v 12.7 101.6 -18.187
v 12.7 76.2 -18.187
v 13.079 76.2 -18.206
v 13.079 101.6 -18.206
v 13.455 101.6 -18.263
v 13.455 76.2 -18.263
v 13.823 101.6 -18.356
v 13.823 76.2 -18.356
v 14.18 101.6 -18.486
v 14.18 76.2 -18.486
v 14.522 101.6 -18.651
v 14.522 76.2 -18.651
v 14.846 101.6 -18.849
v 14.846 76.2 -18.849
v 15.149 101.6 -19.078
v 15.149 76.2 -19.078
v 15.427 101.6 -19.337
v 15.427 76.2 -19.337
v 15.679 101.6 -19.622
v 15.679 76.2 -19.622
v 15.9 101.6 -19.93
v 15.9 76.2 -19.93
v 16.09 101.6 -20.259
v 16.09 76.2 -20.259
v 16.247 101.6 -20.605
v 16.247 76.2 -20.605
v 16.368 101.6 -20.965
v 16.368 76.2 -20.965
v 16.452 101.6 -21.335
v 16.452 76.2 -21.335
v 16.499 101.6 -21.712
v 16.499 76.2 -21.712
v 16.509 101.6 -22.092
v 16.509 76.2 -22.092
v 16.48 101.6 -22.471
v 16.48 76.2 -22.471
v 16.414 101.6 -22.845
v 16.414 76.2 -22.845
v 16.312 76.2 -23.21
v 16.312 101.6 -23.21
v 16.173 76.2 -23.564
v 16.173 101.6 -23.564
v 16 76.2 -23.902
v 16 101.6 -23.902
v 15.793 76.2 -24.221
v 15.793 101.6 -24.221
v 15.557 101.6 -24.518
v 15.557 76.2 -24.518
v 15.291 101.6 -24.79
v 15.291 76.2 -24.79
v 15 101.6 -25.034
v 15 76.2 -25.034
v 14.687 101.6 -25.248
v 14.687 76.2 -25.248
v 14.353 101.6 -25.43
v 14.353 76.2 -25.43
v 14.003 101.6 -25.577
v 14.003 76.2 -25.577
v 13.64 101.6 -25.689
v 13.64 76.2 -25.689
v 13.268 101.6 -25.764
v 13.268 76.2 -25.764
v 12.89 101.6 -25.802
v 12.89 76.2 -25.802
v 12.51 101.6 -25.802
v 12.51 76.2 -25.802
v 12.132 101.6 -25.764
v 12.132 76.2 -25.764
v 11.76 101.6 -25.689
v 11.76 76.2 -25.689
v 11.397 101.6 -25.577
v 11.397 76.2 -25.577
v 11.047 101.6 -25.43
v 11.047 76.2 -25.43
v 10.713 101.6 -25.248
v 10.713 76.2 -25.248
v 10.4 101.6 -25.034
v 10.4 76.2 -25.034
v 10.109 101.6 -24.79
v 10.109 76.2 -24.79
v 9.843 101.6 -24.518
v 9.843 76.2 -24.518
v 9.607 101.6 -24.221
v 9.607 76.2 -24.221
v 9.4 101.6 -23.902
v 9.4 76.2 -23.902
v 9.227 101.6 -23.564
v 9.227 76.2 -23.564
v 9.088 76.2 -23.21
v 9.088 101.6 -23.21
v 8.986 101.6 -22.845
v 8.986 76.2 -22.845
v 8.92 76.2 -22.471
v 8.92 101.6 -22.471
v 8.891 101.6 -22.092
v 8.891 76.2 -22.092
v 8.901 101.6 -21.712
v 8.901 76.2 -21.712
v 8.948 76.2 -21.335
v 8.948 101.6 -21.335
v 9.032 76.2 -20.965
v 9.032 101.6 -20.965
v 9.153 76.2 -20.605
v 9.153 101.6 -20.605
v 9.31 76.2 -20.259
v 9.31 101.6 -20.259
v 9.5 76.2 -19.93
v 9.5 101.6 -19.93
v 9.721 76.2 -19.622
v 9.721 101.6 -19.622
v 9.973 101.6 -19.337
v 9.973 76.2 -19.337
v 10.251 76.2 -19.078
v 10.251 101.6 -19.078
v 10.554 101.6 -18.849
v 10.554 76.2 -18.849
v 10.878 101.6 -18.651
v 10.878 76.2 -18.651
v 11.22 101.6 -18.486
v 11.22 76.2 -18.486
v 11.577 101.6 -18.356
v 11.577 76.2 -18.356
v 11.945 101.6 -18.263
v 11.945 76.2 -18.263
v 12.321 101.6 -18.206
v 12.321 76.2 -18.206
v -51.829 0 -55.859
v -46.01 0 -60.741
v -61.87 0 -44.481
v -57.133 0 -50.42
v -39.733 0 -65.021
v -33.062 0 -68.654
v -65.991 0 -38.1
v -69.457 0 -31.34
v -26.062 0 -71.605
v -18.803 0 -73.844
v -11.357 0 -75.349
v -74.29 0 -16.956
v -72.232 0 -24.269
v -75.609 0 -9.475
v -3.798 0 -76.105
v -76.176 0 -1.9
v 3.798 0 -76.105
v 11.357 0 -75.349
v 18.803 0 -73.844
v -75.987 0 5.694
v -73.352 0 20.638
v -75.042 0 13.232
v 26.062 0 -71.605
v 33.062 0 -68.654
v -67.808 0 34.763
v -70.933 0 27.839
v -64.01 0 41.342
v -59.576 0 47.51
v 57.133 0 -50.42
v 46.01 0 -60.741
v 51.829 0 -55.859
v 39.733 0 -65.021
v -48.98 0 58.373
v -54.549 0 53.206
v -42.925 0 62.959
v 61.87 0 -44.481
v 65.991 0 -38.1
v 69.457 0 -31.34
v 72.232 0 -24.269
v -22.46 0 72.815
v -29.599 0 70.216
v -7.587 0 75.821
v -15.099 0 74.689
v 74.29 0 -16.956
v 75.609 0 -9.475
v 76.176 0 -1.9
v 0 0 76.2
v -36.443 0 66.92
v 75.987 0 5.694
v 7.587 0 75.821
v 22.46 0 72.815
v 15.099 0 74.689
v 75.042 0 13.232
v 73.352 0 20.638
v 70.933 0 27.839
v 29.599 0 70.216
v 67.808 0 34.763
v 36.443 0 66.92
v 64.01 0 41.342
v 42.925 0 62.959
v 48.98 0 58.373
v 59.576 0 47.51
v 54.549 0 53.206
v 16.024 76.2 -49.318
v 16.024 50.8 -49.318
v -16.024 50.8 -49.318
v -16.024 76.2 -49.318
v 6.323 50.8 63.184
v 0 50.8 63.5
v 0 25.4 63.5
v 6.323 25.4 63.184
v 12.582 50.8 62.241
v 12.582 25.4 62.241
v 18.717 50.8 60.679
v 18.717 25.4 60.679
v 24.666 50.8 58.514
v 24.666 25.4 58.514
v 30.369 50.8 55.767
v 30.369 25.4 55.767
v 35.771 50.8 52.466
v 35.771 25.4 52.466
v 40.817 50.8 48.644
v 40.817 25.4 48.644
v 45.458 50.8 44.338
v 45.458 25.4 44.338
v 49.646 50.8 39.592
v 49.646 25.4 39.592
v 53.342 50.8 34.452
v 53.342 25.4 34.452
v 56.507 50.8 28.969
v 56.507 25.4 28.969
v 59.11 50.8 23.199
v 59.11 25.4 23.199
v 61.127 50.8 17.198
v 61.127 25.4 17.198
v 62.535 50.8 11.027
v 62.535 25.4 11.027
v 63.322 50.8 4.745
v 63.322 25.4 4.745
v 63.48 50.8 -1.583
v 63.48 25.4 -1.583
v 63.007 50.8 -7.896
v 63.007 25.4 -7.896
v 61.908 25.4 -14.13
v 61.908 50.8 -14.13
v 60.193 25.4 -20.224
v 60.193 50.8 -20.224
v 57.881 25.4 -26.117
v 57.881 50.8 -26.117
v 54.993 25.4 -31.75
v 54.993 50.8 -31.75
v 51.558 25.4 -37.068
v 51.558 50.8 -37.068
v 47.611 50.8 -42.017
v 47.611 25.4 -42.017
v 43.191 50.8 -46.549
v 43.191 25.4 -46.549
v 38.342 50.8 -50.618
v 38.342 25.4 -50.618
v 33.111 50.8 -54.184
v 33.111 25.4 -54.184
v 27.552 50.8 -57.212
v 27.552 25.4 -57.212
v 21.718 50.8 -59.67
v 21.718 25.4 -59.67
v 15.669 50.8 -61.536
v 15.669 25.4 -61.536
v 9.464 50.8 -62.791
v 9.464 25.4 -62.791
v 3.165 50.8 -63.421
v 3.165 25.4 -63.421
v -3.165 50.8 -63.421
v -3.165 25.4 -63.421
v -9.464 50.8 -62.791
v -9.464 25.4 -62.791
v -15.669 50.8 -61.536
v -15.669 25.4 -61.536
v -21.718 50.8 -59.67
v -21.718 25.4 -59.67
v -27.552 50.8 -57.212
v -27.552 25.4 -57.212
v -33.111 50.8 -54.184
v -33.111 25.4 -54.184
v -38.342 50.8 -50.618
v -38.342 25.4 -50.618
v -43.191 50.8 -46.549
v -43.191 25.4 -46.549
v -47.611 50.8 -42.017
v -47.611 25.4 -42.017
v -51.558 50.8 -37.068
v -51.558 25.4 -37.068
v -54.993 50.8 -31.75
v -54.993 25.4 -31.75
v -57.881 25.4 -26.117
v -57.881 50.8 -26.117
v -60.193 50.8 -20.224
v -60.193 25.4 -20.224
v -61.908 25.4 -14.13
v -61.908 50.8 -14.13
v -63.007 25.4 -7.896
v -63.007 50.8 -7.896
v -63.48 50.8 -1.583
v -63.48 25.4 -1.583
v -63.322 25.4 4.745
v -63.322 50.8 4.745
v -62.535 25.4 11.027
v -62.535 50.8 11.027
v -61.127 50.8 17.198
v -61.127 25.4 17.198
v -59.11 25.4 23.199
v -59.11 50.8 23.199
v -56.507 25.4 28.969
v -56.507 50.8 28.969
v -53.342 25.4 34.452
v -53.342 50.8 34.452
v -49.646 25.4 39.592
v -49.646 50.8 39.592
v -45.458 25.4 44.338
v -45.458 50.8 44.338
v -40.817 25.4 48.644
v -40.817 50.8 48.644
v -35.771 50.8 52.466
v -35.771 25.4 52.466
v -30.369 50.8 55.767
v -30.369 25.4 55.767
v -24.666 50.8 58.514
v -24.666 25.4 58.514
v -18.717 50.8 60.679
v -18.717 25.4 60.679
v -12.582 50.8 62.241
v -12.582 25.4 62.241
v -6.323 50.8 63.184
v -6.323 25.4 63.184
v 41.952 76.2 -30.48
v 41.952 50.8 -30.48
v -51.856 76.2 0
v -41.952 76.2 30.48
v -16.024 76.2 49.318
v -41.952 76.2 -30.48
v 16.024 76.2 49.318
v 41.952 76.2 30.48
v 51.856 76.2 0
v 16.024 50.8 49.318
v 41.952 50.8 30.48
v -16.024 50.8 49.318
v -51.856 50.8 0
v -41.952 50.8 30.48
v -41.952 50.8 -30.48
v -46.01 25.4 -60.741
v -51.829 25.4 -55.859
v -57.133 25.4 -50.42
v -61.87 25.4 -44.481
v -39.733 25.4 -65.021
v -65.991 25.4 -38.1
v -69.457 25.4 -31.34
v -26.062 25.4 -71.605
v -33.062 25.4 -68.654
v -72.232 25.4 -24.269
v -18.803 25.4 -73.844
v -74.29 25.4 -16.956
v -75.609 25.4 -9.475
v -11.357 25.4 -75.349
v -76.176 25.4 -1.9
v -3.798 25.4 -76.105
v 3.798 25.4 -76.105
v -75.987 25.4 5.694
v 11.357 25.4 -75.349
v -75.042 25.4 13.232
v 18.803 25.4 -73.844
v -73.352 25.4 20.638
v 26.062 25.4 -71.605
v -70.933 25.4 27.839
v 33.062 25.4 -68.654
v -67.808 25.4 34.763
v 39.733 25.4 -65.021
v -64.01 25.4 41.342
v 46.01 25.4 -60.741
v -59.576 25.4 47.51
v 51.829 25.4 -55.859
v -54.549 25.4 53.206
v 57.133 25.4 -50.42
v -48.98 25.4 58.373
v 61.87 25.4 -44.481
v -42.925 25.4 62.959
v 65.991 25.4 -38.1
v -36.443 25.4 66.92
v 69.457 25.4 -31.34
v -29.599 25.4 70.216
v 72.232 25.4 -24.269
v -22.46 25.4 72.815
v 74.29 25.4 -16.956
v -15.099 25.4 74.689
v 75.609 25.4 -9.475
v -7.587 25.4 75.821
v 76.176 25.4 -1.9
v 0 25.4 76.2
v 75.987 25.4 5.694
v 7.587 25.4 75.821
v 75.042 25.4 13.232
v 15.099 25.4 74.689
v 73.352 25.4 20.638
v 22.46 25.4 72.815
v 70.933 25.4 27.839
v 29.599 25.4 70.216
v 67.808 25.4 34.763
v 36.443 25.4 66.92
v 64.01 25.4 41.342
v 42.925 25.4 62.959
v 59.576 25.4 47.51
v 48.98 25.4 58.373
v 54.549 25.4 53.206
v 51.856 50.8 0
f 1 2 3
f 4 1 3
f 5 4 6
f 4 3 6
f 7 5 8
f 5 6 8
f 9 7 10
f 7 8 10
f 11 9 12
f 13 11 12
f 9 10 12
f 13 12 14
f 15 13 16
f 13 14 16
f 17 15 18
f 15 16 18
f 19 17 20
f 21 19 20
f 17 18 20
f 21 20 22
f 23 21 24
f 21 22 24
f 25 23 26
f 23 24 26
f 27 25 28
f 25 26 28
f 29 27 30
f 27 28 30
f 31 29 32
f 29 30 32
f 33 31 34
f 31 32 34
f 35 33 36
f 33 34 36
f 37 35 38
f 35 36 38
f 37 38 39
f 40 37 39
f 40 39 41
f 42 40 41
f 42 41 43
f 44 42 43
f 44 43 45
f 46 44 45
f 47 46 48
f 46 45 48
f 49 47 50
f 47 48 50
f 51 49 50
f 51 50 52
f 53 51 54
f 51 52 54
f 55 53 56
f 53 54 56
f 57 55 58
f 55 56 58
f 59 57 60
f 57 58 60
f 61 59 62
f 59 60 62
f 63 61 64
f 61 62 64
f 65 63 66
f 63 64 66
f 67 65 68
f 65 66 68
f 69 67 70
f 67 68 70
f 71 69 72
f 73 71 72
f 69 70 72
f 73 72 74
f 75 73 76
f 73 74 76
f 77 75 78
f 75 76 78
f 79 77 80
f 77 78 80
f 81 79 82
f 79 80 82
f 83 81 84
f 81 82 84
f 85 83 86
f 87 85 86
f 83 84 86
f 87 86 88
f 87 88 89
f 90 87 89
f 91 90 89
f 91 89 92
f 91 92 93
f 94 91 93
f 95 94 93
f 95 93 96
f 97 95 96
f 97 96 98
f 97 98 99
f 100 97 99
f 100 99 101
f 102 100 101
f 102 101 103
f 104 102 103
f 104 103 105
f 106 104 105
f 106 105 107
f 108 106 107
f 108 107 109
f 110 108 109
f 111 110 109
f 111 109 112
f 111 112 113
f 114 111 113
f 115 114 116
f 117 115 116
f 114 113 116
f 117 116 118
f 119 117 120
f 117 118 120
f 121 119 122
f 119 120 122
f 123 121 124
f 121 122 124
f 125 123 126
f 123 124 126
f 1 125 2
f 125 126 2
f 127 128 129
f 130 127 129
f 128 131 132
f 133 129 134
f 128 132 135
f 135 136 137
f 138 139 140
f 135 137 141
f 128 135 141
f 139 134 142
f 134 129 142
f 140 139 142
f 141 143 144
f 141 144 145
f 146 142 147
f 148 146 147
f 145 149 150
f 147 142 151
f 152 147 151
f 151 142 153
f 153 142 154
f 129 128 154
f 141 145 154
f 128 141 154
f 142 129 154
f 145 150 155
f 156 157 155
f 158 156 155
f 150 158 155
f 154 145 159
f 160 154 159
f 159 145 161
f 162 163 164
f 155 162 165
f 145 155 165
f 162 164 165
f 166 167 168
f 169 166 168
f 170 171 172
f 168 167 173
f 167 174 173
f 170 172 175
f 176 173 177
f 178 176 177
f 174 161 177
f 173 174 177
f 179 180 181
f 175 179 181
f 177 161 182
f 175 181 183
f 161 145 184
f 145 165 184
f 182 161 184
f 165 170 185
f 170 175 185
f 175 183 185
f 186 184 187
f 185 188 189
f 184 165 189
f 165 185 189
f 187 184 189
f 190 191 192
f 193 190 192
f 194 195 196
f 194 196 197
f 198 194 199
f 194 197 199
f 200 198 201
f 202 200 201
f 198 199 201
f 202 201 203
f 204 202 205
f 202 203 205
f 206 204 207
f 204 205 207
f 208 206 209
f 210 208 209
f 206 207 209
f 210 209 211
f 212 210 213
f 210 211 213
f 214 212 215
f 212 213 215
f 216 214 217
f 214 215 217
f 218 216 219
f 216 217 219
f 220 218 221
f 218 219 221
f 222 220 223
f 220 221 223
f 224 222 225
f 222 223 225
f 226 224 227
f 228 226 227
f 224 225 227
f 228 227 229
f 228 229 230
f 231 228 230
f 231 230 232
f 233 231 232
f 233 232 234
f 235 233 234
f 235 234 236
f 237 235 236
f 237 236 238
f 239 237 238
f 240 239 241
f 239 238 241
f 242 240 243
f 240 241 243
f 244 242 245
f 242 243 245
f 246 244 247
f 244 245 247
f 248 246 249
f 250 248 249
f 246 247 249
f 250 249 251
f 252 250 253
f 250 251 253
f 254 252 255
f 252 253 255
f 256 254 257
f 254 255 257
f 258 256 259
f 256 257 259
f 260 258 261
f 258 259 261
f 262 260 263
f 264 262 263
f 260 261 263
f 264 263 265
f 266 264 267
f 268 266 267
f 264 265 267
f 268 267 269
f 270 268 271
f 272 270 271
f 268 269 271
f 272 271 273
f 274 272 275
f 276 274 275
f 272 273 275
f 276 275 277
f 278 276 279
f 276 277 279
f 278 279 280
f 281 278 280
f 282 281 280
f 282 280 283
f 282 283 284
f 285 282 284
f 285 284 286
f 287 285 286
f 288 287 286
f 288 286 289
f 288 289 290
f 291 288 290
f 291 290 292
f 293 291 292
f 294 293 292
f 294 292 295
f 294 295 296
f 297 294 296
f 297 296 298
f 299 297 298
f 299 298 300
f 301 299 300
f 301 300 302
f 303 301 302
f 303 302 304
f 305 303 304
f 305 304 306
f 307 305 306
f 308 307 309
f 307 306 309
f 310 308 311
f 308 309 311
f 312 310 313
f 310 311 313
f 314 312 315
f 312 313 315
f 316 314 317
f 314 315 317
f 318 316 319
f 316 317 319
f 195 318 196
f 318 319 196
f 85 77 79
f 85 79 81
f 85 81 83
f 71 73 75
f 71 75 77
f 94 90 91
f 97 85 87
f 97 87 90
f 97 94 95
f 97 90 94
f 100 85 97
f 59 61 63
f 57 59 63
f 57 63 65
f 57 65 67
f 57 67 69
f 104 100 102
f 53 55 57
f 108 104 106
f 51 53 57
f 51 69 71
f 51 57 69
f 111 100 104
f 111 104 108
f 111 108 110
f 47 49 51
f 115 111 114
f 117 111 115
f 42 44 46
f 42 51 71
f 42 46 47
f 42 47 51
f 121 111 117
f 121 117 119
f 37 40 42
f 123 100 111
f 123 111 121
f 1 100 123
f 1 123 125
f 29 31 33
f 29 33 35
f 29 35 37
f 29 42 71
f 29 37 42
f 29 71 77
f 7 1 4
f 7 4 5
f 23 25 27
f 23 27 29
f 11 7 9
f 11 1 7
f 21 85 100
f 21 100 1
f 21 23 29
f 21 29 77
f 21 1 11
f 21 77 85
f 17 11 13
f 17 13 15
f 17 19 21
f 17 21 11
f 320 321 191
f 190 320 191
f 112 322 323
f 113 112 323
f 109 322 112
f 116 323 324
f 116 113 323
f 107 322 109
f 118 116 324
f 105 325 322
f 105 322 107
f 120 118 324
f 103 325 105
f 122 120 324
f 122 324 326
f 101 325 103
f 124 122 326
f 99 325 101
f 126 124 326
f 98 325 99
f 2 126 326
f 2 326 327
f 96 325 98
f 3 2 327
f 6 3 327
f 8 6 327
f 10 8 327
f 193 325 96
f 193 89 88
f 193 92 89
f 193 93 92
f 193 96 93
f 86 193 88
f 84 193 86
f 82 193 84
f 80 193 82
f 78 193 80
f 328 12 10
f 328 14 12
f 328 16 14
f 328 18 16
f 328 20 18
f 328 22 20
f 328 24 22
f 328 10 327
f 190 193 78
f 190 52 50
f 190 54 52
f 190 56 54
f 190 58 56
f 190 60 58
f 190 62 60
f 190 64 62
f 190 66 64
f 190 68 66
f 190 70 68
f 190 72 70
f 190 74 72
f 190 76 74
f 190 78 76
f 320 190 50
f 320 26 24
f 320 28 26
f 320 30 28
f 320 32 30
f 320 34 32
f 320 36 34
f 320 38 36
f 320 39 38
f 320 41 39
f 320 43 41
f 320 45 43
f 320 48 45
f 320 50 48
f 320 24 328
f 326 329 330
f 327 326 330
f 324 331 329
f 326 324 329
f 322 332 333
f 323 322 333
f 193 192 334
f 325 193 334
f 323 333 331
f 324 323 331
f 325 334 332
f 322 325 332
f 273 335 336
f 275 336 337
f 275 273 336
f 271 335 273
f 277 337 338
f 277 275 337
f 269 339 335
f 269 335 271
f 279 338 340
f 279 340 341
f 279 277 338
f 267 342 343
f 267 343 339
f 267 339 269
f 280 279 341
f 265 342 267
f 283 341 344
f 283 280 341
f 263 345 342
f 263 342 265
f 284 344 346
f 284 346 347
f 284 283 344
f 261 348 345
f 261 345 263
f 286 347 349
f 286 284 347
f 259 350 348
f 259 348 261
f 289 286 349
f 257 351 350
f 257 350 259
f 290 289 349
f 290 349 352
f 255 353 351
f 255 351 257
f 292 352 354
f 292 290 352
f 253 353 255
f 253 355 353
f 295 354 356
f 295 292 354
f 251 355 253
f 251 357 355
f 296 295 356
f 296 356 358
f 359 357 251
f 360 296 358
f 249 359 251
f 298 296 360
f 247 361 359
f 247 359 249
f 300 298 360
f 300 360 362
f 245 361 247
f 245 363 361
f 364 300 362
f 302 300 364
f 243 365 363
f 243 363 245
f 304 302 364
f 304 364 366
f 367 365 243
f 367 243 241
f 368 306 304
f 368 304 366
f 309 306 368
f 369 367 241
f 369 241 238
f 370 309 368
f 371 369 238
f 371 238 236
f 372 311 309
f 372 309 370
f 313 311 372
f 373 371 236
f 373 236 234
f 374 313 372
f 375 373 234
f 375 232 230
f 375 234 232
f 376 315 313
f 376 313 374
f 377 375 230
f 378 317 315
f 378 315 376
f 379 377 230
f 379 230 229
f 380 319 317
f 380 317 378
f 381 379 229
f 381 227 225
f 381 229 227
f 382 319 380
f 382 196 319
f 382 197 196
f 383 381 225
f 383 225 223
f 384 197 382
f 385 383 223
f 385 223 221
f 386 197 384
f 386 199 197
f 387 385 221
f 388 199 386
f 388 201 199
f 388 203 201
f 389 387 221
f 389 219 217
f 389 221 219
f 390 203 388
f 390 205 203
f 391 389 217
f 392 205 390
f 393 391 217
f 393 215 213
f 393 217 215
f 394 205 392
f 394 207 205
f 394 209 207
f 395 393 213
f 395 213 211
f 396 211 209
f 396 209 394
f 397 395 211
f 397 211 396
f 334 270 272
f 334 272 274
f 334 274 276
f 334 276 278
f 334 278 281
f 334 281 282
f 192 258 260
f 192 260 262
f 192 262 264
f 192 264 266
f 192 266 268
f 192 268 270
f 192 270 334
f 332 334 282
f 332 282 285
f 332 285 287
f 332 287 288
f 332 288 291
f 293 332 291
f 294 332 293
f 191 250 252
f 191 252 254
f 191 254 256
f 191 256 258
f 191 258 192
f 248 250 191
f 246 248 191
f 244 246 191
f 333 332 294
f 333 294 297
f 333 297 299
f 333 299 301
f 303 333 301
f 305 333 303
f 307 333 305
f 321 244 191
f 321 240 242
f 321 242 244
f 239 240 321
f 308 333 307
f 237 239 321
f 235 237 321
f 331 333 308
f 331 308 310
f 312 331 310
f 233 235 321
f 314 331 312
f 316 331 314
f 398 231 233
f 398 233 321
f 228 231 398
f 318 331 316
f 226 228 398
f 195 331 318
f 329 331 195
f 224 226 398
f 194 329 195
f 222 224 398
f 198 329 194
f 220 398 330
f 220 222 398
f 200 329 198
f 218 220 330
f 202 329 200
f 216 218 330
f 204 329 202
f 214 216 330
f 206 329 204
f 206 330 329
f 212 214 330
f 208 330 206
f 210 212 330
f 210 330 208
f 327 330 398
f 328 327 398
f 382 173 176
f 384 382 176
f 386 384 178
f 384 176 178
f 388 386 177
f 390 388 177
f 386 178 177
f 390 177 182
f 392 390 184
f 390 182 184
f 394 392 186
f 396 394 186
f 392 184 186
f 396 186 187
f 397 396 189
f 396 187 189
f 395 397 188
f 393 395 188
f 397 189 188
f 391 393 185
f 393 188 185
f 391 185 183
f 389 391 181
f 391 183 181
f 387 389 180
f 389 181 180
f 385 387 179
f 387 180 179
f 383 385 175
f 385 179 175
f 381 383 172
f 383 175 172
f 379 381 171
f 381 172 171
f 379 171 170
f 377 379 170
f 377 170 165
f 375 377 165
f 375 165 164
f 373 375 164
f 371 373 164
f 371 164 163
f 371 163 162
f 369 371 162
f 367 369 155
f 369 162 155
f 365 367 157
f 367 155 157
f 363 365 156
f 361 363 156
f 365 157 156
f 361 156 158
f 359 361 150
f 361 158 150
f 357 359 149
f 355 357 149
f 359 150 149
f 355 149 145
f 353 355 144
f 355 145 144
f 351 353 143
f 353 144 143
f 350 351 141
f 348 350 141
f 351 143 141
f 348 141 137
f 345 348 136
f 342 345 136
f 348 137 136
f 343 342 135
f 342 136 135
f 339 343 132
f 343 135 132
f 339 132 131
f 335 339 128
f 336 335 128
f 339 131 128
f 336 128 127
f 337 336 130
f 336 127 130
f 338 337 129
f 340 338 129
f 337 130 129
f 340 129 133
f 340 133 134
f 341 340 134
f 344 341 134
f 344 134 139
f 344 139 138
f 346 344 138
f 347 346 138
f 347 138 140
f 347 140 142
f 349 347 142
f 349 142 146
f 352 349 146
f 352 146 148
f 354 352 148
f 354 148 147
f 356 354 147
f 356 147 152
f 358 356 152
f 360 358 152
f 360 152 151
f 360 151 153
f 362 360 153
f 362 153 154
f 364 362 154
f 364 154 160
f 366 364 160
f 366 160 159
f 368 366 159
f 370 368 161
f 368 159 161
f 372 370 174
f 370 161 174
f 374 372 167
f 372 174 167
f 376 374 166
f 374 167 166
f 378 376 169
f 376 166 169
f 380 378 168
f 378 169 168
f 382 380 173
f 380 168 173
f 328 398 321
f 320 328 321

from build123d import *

# Parameters (mm, degrees)
SKETCH2_R           = 76.2
BOSS_EXTRUDE1_DEPTH = 25.4
SKETCH3_R           = 63.5
BOSS_EXTRUDE2_DEPTH = 25.4
BOSS_EXTRUDE3_DEPTH = 25.4
SKETCH5_R           = 3.81
BOSS_EXTRUDE4_DEPTH = 25.4


with BuildPart() as part:
    # Sketch2 → Boss-Extrude1 (new body)
    with BuildSketch(Plane(origin=(0, 0, 0), x_dir=(1, 0, 0), z_dir=(0, 1, 0))):
        with Locations(Location((0, 0, 0), (0, 0, 270))):
            Circle(SKETCH2_R)
    extrude(amount=BOSS_EXTRUDE1_DEPTH)

    # Sketch3 → Boss-Extrude2 (add)
    with BuildSketch(Plane(origin=(0, 25.4, 0), x_dir=(1, 0, 0), z_dir=(0, 1, 0))):
        with Locations(Location((0, 0, 0), (0, 0, 270))):
            Circle(SKETCH3_R)
    extrude(amount=BOSS_EXTRUDE2_DEPTH)

    # Sketch4 → Boss-Extrude3 (add)
    with BuildSketch(Plane(origin=(0, 50.8, 0), x_dir=(1, 0, 0), z_dir=(0, 1, 0))):
        Polygon((41.952120936, -30.48), (51.855673277, 0), (41.952120936, 30.48), (16.024284297, 49.317675977), (-16.024284297, 49.317675977), (-41.952120936, 30.48), (-51.855673277, 0), (-41.952120936, -30.48), (-16.024284297, -49.317675977), (16.024284297, -49.317675977), align=None)
    extrude(amount=BOSS_EXTRUDE3_DEPTH)

    # Sketch5 → Boss-Extrude4 (add)
    with BuildSketch(Plane(origin=(0, 76.2, 0), x_dir=(1, 0, 0), z_dir=(0, 1, 0))):
        with Locations(Location((12.7, 21.997045256, 0), (0, 0, 270))):
            Circle(SKETCH5_R)
    extrude(amount=BOSS_EXTRUDE4_DEPTH)


solid = part.part
